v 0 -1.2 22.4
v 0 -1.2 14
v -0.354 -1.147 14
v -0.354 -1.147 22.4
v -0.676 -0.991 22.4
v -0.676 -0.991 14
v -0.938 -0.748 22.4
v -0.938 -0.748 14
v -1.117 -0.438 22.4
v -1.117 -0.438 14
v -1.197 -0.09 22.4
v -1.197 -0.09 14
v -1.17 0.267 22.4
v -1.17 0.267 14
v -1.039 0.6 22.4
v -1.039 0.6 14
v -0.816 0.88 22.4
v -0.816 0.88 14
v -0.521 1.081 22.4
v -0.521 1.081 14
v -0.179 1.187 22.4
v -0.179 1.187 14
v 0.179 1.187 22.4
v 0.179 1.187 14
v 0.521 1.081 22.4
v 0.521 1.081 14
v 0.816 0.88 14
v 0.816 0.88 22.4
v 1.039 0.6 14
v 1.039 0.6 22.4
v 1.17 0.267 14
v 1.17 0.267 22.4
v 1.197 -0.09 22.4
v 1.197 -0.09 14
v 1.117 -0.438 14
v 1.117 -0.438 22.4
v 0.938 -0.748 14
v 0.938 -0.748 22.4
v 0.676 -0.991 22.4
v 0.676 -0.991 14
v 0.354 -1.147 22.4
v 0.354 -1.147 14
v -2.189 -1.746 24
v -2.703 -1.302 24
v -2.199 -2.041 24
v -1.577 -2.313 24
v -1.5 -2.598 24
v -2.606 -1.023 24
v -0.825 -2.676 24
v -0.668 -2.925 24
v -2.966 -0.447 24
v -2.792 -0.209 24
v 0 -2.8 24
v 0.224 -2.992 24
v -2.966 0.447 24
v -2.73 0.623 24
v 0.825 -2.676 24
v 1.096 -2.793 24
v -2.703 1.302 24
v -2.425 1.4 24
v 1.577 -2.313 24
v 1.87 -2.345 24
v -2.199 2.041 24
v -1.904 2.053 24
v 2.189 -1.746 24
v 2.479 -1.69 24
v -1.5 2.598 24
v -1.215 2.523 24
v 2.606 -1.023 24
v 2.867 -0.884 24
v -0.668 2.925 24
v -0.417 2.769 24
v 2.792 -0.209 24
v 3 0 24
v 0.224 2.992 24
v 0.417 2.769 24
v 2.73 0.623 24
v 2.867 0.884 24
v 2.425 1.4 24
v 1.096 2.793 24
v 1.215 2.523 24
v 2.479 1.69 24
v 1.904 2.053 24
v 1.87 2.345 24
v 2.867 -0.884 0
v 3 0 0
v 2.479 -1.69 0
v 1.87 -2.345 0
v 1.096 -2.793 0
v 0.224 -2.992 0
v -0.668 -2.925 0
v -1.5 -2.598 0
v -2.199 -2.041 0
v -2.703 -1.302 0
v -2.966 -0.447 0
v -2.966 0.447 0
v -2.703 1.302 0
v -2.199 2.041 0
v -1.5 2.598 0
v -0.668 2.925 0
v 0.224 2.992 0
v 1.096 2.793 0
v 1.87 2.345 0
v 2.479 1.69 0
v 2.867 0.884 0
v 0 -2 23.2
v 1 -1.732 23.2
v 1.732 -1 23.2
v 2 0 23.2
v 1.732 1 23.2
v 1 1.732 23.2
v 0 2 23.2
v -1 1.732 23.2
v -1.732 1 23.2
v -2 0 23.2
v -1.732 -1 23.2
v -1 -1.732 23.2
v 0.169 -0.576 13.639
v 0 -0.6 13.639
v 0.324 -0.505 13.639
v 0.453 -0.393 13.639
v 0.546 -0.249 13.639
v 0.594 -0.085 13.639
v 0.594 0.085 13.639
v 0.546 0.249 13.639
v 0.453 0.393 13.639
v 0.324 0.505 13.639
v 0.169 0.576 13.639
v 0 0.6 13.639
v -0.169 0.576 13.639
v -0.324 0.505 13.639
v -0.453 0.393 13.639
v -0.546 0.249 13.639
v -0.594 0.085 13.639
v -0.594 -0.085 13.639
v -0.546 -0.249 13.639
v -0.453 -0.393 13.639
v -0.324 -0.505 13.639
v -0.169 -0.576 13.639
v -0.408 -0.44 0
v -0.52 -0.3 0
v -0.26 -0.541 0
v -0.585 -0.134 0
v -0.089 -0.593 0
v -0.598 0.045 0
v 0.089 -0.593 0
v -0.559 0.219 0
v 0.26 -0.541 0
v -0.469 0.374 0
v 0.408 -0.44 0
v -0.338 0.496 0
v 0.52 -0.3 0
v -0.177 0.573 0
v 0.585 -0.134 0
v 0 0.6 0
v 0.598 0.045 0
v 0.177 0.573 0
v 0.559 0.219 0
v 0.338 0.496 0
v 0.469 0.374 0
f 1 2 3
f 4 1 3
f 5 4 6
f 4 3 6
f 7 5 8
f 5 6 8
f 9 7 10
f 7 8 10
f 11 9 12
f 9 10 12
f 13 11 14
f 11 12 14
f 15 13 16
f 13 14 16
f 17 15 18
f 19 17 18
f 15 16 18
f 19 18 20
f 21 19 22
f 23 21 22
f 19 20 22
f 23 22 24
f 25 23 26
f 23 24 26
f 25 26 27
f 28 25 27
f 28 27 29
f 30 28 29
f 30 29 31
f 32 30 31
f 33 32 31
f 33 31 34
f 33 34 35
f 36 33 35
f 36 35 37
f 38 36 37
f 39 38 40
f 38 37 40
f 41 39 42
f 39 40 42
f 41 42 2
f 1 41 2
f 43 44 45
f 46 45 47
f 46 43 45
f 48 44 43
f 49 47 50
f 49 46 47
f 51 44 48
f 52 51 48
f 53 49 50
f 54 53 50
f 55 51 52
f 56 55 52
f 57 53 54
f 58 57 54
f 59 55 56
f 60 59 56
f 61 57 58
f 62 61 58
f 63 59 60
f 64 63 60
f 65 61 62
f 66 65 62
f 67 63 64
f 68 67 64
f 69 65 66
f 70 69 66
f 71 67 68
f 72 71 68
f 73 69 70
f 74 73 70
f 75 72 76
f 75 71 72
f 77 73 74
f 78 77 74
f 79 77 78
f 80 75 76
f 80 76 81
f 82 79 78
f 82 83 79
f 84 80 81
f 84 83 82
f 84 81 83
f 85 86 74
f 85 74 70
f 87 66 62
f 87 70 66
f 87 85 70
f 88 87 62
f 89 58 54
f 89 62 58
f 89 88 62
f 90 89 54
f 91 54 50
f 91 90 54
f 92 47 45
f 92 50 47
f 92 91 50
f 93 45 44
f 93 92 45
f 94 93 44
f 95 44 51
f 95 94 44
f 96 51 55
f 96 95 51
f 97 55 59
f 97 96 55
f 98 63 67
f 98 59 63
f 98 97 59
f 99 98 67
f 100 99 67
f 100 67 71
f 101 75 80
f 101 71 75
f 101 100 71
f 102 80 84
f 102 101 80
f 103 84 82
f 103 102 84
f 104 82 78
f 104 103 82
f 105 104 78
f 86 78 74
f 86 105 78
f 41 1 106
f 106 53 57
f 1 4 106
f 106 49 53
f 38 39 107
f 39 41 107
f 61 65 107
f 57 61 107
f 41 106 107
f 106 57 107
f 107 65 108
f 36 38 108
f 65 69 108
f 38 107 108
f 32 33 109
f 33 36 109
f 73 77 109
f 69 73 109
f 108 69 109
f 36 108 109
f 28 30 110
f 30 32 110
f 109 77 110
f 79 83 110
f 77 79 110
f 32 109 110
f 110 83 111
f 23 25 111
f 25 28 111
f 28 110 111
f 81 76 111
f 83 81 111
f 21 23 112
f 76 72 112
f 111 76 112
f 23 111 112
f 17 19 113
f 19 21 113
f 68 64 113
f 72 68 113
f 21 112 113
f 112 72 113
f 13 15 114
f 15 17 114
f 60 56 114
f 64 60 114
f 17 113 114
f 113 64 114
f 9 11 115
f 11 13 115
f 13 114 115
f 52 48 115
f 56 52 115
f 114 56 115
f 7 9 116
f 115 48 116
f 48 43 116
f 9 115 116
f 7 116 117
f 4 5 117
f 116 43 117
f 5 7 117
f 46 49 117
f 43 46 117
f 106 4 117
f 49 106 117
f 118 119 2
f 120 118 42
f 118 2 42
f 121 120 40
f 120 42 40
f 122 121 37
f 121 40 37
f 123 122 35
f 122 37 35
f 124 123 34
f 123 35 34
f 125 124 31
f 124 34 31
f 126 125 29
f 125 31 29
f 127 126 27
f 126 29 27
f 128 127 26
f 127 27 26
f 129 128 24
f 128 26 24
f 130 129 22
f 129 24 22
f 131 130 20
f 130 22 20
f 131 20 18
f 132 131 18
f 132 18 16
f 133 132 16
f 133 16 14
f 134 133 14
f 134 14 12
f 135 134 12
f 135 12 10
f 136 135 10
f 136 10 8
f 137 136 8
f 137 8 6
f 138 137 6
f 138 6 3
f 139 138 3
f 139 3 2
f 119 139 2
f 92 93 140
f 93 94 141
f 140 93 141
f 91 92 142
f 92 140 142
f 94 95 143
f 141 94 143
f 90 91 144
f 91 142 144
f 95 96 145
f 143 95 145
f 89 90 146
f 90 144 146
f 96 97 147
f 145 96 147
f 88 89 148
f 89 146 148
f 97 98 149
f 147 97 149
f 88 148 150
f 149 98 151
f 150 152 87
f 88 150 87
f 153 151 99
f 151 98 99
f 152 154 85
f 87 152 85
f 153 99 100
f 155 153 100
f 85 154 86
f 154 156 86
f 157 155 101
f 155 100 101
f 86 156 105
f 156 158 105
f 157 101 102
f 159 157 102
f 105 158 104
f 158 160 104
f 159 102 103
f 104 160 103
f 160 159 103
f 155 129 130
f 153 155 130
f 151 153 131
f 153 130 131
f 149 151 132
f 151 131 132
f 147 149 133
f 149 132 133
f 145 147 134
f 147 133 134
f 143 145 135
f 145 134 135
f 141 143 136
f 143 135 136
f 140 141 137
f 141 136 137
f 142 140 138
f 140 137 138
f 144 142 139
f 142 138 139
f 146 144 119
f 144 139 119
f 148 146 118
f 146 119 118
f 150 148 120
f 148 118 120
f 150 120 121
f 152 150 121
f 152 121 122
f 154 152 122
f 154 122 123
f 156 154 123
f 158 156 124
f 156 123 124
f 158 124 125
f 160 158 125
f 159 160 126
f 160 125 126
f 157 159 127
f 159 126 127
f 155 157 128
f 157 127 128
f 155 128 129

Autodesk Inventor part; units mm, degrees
ref_plane "YZ Plane" through (0, 0, 0) normal (1, 0, 0) x (0, 1, 0)
ref_plane "XZ Plane" through (0, 0, 0) normal (0, 1, 0) x (-1, 0, 0)
ref_plane "XY Plane" through (0, 0, 0) normal (0, 0, 1) x (1, 0, 0)
sketch "Skizze1" plane through (0, 0, 0) normal (0, 0, 1) x (1, 0, 0)
  circle A0 centre (0, 0) radius 3
  dimension "d0" = 6
extrude "Extrusion1" add sketch "Skizze1" along normal blind 24
sketch "Skizze2" plane through (0, 0, 0) normal (0, 0, -1) x (-1, 0, 0)
  point P0 (0, 0)
hole "Bohrung1" at (0, 0, 0) direction (0, 0, 1) diameter 1.2 end through all
sketch "Skizze3" plane through (0, 0, 24) normal (0, 0, 1) x (1, 0, 0)
  point P0 (0, 0)
hole "Bohrung2" at (0, 0, 24) direction (0, 0, -1) diameter 2.4 depth 10 tip angle 118
chamfer "Fase1" distance 1.6 angle 45 1 edges at (0, 1.2, 24)
properties part number "PTFE - Isolator" material "Polytetrafluoroethylen"
